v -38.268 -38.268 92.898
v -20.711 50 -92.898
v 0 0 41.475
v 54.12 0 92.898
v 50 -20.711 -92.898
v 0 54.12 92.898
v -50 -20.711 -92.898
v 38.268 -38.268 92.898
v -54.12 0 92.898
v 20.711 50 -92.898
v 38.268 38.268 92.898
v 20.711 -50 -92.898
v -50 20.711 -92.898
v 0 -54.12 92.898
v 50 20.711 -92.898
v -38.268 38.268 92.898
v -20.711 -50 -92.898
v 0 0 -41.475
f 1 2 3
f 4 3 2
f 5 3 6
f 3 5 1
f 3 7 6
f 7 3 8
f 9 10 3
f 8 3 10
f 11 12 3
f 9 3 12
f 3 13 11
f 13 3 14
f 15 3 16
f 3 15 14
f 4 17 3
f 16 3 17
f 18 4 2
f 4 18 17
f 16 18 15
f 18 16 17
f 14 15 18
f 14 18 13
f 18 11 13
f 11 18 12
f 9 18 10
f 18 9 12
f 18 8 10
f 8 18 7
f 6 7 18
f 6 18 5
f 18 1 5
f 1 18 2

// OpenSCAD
// Octagrammic Concave Trapezohedron
//   coords via:
//     http://dmccooey.com/polyhedra/OctagrammicConcaveTrapezohedron.html
//
scaling_factor = 100;

C0 = (sqrt(2) - 1) / 2;
C1 = sqrt(2 - sqrt(2)) / 2;
C2 = sqrt(2 * (30 - 20 * sqrt(2) - sqrt(2 * (850 - 601 * sqrt(2))))) / 4;
C3 = sqrt(2 * (2 - sqrt(2))) / 2;
C4 = sqrt(2 * (4 * sqrt(2) + 3 * sqrt(2 * (2 - sqrt(2))) - 2)) / 4;

vertices = [
  [0.0,  0.0,  C2], [0.0,  0.0, -C2], 
  [C3,  0.0,  C4], [-C3,  0.0,  C4], 
  [0.0,   C3,  C4], [0.0,  -C3,  C4], 
  [-C1,  -C1,  C4], [-C1,   C1,  C4], 
  [C1,  -C1,  C4], [C1,   C1,  C4], 
  [-C0,  0.5, -C4], [-C0, -0.5, -C4], 
  [C0,  0.5, -C4], [C0, -0.5, -C4], 
  [0.5,  -C0, -C4], [0.5,   C0, -C4], 
  [-0.5,  -C0, -C4], [-0.5,   C0, -C4]
];

faces = [
  [ 0,  2, 10,  6], [ 0,  6, 14,  4], [ 0,  4, 16,  8], [ 0,  8, 12,  3], 
  [ 0,  3, 13,  9], [ 0,  9, 17,  5], [ 0,  5, 15,  7], [ 0,  7, 11,  2], 
  [ 1, 10,  2, 11], [ 1, 11,  7, 15], [ 1, 15,  5, 17], [ 1, 17,  9, 13], 
  [ 1, 13,  3, 12], [ 1, 12,  8, 16], [ 1, 16,  4, 14], [ 1, 14,  6, 10]
];

scale(scaling_factor) {
  polyhedron(points=vertices, faces=faces, convexity=20);
}
